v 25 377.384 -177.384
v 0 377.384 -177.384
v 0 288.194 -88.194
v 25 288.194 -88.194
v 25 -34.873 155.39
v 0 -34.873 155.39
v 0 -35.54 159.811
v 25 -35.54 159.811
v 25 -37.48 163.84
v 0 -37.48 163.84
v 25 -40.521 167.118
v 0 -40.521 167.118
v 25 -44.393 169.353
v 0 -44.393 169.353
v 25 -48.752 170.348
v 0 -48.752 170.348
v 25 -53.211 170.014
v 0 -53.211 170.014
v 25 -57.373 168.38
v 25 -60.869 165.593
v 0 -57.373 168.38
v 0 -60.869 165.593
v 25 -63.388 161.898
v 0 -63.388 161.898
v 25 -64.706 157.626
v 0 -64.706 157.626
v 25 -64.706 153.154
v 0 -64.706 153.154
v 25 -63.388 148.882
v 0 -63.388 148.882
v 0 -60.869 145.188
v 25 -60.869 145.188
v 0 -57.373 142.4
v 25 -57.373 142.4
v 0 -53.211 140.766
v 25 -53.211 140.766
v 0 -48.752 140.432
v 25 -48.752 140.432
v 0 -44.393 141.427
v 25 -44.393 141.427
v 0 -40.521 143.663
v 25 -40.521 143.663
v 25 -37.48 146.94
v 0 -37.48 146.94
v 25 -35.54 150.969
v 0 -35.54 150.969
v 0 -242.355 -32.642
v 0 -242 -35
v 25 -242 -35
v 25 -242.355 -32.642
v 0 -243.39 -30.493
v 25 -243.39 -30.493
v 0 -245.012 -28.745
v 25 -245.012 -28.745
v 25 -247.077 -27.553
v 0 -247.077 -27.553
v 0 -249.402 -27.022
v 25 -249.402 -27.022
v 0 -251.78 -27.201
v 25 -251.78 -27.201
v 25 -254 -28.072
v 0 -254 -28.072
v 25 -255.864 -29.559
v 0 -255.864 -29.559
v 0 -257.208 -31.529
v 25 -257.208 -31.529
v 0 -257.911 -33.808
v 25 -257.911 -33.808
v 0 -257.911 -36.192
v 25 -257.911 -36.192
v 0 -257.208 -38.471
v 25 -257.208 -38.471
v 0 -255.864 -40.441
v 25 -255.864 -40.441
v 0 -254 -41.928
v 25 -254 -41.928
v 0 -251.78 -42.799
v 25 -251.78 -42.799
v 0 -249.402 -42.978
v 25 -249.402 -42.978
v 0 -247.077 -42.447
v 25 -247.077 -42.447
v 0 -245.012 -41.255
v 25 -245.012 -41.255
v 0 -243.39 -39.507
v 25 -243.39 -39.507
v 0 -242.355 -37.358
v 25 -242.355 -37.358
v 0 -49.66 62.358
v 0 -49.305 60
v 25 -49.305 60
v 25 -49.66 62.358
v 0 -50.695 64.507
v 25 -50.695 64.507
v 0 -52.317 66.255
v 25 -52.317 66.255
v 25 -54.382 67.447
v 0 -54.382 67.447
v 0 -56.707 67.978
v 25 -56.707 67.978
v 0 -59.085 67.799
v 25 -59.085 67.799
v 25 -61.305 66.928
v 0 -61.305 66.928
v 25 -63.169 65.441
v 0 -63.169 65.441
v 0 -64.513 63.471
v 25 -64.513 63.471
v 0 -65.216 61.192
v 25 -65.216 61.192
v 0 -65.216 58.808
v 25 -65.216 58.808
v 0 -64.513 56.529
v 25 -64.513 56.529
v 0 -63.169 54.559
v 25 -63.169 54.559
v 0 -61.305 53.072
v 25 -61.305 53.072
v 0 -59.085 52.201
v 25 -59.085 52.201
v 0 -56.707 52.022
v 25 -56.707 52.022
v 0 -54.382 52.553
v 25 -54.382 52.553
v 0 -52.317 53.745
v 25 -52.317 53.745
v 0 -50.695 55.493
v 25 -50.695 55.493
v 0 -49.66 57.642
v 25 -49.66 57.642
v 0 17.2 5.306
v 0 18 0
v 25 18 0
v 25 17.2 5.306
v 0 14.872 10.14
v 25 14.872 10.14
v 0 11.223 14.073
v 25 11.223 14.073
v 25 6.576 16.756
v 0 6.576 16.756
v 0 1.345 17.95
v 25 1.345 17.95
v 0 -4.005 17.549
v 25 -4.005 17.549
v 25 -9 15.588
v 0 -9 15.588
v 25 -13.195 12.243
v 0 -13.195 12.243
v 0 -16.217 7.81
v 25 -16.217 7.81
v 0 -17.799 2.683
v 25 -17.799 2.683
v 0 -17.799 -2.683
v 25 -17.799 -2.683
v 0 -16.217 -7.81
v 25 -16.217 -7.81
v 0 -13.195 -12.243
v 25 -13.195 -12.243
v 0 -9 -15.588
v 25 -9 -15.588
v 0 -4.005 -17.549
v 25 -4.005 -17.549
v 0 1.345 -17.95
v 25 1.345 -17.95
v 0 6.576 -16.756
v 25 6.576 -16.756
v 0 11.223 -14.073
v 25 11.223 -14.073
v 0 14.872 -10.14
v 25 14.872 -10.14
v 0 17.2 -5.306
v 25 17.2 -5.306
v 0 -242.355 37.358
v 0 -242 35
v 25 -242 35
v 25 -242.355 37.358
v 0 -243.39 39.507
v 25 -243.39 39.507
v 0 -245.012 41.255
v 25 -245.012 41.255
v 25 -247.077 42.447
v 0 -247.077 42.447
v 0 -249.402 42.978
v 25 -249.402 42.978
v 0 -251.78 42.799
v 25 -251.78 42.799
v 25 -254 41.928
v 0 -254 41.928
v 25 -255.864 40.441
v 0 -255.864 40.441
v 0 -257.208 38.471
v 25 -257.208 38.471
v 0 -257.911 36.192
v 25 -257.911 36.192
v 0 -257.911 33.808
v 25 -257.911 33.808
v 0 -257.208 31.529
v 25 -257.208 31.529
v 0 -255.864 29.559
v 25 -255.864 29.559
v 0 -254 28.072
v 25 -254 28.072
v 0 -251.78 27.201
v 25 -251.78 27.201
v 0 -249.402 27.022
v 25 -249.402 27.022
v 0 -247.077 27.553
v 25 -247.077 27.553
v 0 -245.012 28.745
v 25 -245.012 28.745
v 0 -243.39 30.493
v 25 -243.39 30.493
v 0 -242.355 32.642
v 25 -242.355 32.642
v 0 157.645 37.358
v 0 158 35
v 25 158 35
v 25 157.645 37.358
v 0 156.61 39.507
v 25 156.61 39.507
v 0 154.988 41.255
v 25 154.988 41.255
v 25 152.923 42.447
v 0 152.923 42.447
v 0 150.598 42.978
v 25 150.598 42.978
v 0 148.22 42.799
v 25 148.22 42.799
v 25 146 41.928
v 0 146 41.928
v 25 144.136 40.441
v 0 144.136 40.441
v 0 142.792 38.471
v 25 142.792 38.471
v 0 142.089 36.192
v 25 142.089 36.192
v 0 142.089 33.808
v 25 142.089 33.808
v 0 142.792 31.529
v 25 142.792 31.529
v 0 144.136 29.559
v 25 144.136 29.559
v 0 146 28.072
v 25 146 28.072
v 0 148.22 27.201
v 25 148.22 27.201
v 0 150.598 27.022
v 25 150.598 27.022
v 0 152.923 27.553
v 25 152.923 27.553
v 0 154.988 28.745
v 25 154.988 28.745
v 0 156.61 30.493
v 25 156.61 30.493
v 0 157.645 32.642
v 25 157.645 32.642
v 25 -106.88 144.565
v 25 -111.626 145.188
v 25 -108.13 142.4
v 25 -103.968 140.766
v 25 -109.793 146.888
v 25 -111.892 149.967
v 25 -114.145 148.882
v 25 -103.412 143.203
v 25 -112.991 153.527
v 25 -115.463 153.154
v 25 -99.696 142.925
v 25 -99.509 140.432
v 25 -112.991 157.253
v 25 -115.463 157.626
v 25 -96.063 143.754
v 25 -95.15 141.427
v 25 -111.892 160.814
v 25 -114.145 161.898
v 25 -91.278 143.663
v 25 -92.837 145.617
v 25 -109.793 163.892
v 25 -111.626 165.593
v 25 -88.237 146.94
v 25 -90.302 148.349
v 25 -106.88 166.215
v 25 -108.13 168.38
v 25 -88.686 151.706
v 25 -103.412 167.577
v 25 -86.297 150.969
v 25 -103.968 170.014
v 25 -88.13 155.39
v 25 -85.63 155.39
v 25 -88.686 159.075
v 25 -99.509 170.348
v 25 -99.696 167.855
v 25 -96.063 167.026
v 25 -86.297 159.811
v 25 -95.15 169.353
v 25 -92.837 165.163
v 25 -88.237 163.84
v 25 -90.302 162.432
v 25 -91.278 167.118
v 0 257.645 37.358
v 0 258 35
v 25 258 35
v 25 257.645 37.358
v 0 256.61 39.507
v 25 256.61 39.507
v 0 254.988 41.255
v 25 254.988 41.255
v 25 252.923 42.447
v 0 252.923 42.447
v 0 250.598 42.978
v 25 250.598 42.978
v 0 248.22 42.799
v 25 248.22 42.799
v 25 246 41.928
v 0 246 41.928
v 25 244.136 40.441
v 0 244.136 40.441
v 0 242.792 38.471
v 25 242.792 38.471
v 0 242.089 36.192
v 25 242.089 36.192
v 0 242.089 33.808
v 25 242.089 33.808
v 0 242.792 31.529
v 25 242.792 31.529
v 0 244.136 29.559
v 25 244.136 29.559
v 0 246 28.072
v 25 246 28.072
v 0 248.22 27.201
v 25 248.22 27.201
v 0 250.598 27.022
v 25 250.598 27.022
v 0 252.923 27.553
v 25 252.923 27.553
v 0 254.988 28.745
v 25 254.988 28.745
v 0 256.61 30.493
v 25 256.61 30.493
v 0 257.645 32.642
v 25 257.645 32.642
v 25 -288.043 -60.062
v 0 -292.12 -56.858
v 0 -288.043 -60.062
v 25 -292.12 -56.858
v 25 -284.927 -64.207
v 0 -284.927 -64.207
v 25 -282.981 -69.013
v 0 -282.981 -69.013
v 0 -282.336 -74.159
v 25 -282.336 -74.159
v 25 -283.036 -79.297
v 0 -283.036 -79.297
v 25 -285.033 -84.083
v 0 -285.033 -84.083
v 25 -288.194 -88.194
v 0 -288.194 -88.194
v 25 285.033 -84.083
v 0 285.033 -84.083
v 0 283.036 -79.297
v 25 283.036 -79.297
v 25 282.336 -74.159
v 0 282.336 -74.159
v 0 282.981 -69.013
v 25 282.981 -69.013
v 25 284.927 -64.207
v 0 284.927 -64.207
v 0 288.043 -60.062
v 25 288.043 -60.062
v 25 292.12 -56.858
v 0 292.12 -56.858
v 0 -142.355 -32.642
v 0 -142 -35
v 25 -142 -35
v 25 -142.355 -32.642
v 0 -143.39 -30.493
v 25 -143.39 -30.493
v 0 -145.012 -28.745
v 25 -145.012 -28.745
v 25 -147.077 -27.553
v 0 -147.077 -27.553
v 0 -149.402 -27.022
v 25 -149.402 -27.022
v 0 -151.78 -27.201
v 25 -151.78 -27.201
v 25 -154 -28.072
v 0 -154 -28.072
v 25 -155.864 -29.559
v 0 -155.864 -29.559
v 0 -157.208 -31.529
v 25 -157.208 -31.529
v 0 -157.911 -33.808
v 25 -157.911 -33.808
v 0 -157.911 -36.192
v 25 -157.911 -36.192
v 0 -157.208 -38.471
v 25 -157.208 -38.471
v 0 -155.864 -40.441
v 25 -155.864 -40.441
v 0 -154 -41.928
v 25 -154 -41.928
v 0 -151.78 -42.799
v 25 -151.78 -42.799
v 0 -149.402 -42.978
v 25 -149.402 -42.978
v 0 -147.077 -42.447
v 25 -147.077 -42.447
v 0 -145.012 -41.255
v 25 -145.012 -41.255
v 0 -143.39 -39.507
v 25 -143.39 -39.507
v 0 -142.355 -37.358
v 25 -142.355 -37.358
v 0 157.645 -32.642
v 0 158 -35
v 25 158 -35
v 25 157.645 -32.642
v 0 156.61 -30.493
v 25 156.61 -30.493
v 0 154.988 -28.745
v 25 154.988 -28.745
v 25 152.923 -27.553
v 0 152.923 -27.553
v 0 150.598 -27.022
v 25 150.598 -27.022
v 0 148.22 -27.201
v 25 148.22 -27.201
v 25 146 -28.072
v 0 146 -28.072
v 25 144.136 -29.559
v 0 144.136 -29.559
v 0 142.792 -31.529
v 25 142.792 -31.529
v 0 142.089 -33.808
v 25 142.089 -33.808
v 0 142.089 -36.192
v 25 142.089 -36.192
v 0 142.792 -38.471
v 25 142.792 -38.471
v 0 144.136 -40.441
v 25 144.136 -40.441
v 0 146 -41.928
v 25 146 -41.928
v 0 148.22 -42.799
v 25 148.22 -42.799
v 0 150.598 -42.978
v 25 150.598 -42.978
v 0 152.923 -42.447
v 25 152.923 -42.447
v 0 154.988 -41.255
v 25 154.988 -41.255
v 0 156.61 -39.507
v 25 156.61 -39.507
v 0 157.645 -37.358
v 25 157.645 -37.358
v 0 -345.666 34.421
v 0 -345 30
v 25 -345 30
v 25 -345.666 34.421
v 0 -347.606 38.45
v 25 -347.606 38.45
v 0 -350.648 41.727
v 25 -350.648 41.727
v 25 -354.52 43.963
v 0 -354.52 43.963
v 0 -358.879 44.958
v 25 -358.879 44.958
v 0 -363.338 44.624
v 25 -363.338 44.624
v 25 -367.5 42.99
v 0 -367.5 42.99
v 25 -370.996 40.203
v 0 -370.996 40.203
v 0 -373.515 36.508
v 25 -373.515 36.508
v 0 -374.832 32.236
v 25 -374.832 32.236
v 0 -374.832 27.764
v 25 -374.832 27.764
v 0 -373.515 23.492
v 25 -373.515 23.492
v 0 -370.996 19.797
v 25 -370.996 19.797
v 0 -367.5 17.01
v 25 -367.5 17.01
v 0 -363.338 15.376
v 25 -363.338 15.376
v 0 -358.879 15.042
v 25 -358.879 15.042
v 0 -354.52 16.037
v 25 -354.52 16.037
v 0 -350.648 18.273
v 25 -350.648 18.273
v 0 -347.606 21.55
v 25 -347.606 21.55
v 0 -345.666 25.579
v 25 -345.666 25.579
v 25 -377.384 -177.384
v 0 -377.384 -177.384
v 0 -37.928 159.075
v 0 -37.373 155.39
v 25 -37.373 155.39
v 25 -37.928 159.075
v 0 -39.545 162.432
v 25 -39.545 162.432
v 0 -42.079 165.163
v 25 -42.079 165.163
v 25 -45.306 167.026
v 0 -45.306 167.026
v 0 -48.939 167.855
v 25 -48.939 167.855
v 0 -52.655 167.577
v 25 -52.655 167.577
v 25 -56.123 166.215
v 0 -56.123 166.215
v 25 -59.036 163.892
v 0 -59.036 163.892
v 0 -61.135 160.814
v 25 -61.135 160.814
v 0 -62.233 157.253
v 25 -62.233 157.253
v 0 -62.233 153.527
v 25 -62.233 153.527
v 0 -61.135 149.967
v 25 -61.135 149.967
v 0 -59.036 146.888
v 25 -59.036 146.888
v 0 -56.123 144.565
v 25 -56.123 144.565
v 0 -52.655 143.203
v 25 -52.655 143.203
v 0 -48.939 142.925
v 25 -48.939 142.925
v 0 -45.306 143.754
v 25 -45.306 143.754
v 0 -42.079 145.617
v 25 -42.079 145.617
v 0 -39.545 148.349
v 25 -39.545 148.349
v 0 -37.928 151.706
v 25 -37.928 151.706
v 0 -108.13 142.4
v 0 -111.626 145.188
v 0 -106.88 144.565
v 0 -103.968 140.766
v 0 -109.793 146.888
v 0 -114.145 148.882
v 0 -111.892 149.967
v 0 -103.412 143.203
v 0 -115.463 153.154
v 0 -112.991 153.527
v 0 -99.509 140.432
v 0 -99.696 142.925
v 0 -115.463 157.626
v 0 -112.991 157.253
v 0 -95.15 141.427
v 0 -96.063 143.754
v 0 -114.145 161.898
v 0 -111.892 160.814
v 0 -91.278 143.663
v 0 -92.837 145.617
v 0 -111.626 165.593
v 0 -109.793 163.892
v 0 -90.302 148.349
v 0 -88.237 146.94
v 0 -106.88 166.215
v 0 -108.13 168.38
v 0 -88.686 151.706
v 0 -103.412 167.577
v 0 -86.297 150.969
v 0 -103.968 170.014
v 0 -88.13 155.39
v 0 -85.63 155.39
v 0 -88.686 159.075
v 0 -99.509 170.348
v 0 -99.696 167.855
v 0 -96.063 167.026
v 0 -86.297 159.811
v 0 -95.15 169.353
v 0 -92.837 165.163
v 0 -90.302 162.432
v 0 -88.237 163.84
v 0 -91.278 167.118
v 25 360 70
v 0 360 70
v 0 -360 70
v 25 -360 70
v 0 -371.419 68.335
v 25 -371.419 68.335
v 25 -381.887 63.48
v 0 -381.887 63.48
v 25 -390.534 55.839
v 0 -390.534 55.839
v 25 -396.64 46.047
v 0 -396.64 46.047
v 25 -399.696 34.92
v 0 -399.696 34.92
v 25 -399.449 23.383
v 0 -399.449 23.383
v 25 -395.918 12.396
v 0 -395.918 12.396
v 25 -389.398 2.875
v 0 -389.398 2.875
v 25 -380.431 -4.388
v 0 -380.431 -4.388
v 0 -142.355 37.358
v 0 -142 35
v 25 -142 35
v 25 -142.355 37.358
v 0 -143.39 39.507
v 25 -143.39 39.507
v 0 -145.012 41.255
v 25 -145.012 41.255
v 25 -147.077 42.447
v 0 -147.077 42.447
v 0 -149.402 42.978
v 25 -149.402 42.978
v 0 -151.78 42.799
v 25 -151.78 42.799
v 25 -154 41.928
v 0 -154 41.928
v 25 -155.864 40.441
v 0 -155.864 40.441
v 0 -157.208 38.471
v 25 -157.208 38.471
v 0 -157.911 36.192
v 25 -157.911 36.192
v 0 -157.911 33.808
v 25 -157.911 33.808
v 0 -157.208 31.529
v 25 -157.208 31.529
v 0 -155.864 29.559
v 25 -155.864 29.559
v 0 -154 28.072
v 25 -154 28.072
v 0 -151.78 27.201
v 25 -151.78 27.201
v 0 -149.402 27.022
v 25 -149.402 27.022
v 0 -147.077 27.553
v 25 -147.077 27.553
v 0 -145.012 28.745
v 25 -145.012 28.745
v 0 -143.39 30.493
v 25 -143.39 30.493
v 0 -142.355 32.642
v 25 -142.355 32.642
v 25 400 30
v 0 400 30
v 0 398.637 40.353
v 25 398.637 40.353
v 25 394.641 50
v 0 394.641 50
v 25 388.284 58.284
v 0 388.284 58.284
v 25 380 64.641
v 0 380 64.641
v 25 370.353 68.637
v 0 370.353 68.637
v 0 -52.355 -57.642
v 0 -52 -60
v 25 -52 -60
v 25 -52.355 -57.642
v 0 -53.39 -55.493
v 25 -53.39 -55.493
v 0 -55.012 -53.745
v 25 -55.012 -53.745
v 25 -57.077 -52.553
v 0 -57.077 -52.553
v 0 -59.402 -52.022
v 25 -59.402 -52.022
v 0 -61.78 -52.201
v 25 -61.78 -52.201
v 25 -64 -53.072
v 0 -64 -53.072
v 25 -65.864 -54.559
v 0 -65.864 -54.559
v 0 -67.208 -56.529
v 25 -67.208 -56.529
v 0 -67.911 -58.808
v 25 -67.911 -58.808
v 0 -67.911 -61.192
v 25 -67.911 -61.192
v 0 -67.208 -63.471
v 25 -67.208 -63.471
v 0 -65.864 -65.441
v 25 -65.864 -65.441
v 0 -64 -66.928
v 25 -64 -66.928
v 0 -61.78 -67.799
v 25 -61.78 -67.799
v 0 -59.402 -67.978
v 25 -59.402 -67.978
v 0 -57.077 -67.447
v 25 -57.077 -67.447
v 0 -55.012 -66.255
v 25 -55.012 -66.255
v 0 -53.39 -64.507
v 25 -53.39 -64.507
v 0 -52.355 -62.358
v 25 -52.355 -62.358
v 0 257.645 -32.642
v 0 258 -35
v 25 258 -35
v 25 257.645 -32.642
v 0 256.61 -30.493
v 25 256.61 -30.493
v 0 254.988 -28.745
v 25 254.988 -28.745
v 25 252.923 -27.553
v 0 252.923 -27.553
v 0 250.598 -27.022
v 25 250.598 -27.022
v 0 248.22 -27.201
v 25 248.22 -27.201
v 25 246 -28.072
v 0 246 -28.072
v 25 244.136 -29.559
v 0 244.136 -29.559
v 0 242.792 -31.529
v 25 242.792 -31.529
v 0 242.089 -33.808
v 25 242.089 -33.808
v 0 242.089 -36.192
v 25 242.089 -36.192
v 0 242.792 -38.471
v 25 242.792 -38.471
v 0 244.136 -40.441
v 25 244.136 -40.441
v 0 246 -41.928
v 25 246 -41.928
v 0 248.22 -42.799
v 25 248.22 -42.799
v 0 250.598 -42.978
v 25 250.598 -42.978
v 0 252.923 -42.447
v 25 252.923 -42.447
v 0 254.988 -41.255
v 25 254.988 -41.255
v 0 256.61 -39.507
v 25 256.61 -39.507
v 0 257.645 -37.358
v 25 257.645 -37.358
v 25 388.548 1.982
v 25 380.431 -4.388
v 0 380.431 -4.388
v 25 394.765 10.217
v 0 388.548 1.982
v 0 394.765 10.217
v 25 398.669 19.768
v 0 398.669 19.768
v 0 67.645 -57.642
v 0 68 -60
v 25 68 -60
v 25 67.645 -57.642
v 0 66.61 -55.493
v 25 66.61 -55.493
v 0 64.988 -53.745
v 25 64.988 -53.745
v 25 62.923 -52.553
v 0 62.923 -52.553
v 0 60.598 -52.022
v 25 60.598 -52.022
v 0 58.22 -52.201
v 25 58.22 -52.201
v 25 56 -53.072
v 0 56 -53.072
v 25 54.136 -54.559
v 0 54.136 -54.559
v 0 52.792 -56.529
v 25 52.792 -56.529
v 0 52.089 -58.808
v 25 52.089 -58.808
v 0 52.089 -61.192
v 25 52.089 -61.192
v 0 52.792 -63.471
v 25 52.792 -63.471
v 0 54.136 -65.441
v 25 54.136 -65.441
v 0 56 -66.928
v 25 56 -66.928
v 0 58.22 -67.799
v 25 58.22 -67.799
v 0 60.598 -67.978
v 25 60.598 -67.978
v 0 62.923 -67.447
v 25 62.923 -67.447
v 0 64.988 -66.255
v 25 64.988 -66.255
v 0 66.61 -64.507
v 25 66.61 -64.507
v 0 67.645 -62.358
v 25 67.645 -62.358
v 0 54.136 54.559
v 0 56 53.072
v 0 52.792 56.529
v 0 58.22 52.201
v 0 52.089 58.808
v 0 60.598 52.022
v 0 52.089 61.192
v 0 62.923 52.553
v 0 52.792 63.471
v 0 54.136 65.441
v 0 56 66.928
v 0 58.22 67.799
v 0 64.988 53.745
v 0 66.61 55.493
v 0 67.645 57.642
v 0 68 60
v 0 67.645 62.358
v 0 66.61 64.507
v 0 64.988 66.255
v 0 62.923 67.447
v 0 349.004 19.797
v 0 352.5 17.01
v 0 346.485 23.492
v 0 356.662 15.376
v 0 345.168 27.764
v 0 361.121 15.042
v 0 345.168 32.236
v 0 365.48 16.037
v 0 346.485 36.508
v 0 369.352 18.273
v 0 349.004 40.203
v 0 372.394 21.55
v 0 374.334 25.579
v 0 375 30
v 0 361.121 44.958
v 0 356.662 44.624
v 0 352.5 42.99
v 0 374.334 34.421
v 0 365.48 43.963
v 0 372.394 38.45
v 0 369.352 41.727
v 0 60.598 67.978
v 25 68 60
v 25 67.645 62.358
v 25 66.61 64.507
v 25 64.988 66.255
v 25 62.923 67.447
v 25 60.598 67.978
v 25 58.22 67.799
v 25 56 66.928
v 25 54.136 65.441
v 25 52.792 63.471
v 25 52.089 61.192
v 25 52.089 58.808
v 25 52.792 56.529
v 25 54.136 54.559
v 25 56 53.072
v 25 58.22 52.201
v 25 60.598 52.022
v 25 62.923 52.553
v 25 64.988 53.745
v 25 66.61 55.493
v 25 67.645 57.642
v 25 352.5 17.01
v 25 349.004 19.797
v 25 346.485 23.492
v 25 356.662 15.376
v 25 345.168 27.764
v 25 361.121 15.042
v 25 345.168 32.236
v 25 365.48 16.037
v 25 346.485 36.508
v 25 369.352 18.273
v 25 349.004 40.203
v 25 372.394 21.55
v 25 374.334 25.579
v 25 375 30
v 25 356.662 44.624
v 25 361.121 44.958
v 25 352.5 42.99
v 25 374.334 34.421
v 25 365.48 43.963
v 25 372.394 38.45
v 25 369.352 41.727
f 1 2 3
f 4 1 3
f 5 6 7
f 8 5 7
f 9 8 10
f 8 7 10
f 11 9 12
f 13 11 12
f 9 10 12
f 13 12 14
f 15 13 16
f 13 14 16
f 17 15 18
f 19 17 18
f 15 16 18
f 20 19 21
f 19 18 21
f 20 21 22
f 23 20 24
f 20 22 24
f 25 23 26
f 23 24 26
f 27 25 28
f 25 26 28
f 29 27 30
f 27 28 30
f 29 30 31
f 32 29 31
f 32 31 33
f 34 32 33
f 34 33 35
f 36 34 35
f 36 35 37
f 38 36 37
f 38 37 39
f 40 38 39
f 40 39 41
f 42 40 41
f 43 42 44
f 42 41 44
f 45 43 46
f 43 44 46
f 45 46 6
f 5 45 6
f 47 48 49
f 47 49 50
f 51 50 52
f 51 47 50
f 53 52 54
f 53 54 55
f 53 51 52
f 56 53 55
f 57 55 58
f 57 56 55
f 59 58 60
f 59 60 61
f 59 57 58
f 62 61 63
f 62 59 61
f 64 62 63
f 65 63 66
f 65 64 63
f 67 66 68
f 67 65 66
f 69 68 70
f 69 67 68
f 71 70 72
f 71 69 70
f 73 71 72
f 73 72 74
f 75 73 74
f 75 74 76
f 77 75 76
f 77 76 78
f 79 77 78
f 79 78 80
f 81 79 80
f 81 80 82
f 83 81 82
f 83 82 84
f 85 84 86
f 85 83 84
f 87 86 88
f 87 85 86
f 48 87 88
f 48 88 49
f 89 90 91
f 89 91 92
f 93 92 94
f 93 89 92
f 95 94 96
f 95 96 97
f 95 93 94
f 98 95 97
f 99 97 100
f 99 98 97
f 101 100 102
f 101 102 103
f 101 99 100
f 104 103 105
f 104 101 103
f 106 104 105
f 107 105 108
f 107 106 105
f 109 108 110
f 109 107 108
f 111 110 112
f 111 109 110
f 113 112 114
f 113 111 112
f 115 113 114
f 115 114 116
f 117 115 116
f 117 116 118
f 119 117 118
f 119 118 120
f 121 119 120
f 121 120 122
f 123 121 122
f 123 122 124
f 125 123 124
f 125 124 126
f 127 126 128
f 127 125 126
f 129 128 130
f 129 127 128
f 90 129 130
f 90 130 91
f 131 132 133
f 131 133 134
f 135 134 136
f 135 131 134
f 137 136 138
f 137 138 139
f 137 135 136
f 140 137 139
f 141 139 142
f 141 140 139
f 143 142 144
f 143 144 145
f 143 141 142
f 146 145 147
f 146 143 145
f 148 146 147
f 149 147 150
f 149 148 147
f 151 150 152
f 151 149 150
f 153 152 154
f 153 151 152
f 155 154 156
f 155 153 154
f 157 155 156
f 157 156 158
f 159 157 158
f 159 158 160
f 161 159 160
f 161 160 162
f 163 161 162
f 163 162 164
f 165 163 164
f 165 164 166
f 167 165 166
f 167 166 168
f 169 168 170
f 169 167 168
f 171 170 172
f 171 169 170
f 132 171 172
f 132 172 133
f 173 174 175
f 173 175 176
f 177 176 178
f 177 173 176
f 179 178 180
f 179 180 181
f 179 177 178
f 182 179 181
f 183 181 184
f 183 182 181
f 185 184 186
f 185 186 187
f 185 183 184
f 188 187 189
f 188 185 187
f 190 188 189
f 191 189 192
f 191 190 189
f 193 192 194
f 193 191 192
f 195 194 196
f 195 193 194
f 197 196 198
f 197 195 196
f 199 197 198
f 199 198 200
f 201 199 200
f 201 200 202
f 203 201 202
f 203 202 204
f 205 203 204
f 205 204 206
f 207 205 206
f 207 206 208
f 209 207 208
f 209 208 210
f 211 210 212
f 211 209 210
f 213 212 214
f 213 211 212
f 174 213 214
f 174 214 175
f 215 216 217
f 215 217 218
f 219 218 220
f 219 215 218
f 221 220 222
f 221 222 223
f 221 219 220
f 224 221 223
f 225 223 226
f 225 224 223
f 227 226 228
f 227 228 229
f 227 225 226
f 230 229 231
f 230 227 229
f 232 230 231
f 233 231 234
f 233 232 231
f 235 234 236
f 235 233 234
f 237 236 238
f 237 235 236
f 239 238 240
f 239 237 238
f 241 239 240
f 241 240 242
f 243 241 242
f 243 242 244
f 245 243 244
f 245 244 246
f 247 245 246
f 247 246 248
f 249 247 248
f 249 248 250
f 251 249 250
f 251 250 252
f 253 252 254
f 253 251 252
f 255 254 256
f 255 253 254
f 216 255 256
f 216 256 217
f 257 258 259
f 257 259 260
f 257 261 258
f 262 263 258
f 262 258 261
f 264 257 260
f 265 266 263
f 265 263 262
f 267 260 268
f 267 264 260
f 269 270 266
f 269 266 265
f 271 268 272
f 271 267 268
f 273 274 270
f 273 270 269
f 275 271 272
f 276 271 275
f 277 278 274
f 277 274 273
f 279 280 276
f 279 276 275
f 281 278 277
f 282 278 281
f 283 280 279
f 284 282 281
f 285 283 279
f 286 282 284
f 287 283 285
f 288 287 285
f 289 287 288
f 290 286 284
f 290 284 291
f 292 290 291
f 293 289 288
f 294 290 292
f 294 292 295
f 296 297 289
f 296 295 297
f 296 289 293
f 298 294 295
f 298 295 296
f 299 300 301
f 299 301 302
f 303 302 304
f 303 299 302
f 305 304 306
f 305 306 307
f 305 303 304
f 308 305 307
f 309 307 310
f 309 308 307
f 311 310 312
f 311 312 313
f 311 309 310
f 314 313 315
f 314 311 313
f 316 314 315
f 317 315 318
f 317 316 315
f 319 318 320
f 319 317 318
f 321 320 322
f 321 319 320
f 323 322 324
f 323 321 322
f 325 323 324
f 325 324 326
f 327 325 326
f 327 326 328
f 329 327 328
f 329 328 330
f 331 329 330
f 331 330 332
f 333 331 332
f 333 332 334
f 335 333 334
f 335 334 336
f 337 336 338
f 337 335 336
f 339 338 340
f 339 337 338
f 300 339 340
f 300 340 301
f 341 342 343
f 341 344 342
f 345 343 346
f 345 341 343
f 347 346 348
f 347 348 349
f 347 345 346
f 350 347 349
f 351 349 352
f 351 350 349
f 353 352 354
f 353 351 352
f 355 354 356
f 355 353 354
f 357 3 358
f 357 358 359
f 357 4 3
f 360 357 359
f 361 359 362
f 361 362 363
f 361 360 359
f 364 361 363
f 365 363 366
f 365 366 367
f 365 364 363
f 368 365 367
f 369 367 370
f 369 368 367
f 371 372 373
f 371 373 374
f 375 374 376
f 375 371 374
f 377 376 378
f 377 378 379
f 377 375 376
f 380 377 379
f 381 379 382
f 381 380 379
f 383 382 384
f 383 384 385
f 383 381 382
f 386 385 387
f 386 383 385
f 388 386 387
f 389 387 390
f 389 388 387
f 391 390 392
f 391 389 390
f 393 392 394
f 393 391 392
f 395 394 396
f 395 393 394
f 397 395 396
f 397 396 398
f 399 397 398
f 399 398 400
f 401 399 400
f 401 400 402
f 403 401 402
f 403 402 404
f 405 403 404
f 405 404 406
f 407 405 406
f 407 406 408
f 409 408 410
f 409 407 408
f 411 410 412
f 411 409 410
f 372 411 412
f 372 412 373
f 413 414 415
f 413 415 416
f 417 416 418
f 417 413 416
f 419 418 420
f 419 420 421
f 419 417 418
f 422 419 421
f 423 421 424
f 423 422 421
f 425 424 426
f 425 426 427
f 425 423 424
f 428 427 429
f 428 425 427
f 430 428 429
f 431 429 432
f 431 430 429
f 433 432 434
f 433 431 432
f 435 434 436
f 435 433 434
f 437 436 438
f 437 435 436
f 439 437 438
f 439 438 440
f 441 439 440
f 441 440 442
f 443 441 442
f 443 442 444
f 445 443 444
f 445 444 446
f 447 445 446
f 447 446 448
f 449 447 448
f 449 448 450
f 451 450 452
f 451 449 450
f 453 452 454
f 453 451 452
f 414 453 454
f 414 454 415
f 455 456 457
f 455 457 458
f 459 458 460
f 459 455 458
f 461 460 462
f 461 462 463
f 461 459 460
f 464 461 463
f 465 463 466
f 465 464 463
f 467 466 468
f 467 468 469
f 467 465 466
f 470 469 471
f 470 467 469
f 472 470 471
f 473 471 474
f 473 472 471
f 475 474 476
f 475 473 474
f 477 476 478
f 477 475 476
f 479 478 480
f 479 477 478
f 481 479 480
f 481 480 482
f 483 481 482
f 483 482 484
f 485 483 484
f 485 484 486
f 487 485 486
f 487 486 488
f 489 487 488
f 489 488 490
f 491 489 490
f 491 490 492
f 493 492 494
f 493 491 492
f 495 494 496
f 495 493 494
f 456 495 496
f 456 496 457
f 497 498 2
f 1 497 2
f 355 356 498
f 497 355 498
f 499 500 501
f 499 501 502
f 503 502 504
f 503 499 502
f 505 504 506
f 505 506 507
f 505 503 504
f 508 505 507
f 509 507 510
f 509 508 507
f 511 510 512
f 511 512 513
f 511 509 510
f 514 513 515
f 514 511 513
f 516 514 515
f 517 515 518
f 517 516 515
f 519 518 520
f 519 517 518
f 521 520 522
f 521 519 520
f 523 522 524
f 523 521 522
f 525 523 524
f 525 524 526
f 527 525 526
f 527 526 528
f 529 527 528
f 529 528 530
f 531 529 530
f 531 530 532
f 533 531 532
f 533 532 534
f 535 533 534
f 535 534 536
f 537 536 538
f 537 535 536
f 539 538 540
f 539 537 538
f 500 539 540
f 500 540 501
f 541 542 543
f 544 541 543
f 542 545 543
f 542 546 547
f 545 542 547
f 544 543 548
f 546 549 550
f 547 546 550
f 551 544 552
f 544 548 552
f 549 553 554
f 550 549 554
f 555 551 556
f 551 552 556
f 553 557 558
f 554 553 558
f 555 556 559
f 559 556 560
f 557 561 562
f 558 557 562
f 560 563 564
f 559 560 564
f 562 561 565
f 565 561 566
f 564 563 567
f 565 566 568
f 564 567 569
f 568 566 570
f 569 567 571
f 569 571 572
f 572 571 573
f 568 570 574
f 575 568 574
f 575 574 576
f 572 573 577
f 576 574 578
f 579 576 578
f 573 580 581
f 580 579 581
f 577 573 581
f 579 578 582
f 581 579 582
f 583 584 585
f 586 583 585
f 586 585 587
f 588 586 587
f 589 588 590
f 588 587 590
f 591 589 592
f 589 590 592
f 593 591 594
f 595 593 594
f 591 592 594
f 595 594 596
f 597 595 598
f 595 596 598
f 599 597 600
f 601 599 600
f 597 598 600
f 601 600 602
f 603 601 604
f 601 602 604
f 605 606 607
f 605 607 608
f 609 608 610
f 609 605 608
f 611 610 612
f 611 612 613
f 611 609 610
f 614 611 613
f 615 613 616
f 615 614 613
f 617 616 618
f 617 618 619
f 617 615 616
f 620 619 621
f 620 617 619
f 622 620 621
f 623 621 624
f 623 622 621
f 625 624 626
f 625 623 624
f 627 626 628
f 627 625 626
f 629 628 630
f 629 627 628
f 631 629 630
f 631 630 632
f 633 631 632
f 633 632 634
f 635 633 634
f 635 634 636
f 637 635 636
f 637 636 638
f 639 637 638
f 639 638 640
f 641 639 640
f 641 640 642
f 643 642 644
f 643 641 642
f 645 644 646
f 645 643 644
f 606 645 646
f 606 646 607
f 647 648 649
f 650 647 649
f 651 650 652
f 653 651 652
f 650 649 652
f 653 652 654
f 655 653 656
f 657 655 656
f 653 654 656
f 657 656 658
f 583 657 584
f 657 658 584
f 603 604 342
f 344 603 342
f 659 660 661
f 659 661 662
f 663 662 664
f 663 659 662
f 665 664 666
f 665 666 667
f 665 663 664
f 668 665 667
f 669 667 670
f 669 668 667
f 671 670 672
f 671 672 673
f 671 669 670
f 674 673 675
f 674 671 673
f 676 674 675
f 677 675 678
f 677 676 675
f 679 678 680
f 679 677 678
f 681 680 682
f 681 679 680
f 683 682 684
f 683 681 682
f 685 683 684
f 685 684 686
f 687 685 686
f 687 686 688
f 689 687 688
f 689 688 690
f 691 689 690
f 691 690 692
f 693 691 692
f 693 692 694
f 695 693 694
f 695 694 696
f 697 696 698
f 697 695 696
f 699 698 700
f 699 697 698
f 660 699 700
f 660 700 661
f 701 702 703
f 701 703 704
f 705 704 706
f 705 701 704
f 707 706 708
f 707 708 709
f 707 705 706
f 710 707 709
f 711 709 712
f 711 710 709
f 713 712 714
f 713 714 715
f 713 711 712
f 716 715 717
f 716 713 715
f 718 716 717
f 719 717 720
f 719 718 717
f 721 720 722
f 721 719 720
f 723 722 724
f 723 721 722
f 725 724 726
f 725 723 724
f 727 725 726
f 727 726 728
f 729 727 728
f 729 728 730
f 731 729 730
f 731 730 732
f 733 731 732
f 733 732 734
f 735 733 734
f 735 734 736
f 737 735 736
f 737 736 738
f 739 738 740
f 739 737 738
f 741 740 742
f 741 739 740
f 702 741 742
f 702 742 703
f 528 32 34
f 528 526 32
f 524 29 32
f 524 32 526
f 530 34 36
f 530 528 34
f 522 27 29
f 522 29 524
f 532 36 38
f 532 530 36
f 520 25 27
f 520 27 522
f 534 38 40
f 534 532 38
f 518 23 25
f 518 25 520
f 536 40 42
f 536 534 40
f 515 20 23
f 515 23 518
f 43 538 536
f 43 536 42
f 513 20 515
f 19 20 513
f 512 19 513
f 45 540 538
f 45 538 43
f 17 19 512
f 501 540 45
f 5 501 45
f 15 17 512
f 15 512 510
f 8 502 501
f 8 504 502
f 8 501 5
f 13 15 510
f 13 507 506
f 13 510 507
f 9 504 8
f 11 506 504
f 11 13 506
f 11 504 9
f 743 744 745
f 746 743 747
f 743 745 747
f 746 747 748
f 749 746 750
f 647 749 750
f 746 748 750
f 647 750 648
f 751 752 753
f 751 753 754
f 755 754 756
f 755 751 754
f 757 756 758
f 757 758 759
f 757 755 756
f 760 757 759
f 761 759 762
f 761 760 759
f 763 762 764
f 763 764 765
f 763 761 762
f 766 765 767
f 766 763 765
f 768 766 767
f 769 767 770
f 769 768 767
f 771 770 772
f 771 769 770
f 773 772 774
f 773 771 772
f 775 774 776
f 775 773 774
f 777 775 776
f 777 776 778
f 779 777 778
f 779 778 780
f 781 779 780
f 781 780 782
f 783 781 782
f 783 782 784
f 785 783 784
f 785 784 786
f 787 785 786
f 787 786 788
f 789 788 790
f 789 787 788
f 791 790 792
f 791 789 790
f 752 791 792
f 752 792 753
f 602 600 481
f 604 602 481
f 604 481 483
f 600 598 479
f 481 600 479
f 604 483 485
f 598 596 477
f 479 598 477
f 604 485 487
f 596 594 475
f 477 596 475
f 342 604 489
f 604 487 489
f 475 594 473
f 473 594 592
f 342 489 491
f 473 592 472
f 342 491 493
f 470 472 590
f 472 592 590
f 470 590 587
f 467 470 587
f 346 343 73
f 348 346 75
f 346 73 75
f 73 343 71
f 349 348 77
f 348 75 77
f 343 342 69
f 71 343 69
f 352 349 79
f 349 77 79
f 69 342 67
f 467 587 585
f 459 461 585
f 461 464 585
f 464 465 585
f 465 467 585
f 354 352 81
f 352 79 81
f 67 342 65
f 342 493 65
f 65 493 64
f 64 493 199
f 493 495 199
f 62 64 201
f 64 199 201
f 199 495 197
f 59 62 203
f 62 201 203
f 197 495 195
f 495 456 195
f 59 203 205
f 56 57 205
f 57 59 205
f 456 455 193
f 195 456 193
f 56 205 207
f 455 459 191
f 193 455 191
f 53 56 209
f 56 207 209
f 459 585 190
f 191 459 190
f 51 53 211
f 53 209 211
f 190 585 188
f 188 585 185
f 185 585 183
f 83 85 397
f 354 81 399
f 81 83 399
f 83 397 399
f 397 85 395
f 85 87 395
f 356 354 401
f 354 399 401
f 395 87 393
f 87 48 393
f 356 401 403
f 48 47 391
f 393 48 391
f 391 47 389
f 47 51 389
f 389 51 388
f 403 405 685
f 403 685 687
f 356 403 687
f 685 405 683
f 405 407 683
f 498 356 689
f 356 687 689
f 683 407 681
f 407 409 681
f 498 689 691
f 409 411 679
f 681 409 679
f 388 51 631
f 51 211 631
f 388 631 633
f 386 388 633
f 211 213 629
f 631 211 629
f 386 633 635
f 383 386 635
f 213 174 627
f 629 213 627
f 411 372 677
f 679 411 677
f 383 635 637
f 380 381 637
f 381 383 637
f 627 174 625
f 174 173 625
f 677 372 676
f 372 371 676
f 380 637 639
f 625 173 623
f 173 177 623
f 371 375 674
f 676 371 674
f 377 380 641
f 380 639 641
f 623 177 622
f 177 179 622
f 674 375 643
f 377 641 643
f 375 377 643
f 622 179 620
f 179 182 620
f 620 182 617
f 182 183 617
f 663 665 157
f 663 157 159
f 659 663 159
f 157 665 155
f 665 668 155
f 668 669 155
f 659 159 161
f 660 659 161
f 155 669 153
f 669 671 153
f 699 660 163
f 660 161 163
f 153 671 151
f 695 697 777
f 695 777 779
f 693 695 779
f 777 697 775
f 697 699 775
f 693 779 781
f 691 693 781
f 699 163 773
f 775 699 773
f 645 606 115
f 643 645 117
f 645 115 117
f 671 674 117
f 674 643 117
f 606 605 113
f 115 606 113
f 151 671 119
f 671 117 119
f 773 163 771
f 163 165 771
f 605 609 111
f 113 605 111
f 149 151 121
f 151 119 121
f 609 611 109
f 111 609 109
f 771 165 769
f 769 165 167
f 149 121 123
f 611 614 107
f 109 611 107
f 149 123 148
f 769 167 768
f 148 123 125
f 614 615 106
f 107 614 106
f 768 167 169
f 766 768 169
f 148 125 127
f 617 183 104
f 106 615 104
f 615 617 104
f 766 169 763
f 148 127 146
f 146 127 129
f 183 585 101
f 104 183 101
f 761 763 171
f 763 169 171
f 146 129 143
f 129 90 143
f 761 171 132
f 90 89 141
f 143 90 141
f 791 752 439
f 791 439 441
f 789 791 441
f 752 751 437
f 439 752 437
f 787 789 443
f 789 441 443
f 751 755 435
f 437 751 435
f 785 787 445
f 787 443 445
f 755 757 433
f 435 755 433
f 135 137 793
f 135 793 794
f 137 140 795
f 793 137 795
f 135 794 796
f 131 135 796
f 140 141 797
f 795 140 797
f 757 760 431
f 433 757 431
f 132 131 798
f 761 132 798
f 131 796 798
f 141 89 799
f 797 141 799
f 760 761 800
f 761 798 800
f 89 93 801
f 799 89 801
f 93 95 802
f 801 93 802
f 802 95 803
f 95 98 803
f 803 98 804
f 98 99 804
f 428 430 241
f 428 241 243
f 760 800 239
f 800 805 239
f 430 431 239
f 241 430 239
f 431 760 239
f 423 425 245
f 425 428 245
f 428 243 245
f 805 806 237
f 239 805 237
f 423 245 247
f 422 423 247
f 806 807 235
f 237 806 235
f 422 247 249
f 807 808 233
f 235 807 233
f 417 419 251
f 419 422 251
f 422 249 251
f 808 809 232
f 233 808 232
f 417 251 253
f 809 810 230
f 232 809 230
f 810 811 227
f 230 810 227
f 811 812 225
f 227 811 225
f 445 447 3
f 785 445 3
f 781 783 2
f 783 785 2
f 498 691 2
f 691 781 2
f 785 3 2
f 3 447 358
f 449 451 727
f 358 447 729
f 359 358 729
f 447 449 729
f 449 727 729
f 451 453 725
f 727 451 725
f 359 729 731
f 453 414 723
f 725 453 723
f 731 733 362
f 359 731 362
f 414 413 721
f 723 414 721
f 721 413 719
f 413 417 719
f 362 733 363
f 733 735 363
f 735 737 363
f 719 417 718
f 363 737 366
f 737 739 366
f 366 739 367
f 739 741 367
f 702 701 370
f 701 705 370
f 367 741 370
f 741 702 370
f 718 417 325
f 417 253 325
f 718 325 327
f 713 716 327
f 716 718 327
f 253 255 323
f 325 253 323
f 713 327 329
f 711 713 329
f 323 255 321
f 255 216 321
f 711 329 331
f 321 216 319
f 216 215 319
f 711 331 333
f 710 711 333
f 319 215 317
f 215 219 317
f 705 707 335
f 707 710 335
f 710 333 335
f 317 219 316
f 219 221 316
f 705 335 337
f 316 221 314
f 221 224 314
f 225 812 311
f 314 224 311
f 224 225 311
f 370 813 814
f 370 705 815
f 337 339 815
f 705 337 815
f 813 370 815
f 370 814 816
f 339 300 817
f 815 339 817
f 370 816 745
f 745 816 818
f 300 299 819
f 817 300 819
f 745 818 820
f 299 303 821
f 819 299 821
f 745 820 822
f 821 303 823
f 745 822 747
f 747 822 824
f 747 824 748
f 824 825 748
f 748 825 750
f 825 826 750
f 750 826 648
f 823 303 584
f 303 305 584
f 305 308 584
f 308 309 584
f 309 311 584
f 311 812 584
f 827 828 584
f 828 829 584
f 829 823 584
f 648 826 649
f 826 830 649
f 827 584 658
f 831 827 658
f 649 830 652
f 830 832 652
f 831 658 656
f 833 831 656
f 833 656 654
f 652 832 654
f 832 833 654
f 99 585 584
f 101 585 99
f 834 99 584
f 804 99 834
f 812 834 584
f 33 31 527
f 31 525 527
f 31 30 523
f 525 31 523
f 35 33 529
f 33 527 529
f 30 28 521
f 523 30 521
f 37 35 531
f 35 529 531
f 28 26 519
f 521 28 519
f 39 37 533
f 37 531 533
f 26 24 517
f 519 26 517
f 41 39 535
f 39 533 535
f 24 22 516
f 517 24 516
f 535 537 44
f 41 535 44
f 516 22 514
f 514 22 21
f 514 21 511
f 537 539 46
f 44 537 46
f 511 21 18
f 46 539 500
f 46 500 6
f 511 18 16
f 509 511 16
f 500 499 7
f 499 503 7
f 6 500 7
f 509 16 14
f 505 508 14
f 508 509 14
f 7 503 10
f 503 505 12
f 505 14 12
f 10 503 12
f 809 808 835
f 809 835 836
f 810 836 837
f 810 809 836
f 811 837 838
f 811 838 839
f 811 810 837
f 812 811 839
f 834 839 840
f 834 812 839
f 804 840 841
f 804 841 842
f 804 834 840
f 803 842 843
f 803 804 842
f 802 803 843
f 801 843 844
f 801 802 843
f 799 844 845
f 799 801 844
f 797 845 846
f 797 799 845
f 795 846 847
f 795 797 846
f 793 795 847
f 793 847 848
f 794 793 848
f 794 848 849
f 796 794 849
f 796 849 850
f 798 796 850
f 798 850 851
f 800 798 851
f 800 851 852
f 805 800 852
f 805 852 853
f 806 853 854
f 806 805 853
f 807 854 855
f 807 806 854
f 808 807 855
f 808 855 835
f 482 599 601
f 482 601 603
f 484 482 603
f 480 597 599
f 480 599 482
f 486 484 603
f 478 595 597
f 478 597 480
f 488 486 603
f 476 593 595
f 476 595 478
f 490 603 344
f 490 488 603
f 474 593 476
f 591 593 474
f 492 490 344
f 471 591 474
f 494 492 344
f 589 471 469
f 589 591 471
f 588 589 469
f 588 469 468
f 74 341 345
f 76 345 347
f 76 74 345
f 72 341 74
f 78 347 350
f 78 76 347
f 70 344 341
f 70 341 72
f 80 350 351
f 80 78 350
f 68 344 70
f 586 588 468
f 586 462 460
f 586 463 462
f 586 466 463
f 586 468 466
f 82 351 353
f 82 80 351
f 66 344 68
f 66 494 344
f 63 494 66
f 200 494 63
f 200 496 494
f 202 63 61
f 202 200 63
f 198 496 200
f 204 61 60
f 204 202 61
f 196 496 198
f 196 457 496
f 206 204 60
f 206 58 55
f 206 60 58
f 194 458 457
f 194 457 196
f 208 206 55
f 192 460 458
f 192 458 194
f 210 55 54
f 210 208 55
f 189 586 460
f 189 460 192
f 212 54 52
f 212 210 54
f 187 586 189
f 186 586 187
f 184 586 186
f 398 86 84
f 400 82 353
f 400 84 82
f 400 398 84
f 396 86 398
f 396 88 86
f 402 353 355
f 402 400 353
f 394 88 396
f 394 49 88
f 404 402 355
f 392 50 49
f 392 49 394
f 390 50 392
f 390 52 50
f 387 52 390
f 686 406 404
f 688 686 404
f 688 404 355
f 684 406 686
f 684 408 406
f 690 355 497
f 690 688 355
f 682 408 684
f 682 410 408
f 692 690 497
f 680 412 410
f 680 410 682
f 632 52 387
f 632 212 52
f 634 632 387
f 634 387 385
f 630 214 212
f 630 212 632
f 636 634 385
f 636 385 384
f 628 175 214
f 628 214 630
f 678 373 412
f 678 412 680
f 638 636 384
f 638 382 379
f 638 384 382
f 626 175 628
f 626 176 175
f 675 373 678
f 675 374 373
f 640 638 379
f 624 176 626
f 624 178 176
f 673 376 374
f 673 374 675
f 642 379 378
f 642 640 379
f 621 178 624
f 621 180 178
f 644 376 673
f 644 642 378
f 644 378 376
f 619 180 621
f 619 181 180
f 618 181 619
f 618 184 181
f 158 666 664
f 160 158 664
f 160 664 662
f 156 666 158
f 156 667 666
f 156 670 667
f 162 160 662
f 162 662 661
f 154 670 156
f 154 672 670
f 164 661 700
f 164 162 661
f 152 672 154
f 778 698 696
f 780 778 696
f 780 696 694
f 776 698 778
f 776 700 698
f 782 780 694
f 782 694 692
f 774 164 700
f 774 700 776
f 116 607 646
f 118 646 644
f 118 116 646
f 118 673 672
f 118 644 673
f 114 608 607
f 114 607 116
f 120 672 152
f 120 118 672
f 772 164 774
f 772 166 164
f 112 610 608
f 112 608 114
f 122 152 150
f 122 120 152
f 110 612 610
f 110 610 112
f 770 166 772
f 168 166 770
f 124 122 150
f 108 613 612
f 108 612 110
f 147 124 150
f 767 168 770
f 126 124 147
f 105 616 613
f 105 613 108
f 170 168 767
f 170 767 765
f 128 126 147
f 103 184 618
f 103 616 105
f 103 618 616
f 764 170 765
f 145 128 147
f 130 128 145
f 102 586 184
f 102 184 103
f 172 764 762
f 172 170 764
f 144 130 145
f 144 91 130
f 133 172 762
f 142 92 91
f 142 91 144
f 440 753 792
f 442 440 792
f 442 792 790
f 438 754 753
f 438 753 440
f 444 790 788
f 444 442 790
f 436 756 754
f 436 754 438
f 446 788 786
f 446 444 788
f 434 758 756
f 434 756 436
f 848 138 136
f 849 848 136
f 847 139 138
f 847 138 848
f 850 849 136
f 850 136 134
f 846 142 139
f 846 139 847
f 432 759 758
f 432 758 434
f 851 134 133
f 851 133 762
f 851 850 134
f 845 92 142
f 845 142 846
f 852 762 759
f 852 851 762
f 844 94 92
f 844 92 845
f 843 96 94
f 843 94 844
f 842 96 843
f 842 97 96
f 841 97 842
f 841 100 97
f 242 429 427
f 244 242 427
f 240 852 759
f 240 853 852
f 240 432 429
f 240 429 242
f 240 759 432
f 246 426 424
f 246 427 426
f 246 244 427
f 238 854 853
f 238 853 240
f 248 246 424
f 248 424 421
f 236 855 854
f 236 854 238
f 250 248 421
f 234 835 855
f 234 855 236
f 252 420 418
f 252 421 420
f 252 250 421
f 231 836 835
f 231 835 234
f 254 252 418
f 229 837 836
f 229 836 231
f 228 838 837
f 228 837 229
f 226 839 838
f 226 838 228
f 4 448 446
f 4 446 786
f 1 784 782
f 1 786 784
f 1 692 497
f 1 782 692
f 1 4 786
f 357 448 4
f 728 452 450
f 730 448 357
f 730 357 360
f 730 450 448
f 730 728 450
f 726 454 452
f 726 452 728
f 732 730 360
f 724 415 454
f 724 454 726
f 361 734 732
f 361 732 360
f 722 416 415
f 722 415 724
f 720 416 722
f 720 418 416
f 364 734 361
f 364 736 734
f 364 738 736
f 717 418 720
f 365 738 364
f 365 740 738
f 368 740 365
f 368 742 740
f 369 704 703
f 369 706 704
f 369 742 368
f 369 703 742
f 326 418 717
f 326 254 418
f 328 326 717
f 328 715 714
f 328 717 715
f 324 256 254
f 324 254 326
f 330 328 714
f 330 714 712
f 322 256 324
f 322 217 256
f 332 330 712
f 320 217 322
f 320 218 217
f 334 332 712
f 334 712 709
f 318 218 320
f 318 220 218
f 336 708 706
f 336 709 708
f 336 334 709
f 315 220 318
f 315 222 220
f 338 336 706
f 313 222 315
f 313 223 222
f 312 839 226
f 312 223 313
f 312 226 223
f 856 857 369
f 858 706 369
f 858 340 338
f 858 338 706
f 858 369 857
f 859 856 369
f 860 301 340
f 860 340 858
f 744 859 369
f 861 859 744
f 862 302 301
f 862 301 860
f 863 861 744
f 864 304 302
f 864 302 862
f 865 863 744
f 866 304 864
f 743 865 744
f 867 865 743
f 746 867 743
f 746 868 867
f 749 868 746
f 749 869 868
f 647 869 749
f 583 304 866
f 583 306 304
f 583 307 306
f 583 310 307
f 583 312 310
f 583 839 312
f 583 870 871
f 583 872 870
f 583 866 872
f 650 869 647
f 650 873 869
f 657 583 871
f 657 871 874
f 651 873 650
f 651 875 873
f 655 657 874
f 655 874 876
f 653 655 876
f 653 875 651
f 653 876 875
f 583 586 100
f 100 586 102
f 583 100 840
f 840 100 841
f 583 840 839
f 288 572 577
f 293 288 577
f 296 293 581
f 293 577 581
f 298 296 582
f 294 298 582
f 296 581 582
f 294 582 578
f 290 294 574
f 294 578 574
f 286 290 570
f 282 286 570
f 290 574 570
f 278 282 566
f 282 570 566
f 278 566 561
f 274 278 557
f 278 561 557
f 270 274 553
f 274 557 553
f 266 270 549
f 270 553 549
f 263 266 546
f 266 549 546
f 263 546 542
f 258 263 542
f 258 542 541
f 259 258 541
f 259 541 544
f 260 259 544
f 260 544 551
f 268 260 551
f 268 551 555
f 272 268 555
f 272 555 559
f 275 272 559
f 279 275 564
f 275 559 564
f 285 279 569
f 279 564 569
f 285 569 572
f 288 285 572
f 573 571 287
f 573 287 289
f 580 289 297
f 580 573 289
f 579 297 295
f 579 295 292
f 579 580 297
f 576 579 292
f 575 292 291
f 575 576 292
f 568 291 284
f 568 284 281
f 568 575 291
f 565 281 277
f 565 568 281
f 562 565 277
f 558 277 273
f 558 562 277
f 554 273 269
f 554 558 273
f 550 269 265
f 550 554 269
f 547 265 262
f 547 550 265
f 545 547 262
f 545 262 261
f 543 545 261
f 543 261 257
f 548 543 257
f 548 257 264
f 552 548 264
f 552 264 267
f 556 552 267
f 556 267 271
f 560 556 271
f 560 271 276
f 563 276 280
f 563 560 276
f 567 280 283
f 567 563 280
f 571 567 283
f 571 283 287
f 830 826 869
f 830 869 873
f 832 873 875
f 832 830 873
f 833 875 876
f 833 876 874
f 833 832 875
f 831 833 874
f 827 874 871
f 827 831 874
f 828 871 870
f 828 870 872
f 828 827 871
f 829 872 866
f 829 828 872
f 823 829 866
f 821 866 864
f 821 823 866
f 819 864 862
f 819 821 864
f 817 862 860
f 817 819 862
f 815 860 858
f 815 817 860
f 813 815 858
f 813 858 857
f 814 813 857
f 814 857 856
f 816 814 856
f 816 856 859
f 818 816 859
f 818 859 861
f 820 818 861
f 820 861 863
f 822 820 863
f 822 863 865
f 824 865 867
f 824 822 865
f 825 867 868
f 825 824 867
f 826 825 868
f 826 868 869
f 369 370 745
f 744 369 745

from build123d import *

# Parameters (mm, degrees)
F0_W     = 540
F0_H     = 140
F0_R     = 8
F0_R_2   = 18
F0_R_3   = 15
F1_DEPTH = 25
F2_R     = 15
F2_R_2   = 12.5
F3_DEPTH = 25
F6_R     = 20


# Not quite as in the source:
# - a feature names something its author has since deleted; it is built from what else it names


with BuildPart() as f1:
    # F0 (on Right) → F1 (new body)
    with BuildSketch(Plane.YZ):
        Rectangle(F0_W, F0_H)
        with Locations((-60, -60)):
            Circle(F0_R, mode=Mode.SUBTRACT)
        with Locations((60, -60)):
            Circle(F0_R, mode=Mode.SUBTRACT)
        with Locations((-250, -35)):
            Circle(F0_R, mode=Mode.SUBTRACT)
        with Locations((-150, -35)):
            Circle(F0_R, mode=Mode.SUBTRACT)
        with Locations((-250, 35)):
            Circle(F0_R, mode=Mode.SUBTRACT)
        with Locations((-150, 35)):
            Circle(F0_R, mode=Mode.SUBTRACT)
        with Locations((-57.3049411178, 60)):
            Circle(F0_R, mode=Mode.SUBTRACT)
        with Locations((150, -35)):
            Circle(F0_R, mode=Mode.SUBTRACT)
        Circle(F0_R_2, mode=Mode.SUBTRACT)
        with Locations((250, -35)):
            Circle(F0_R, mode=Mode.SUBTRACT)
        with Locations((150, 35)):
            Circle(F0_R, mode=Mode.SUBTRACT)
        with Locations((60, 60)):
            Circle(F0_R, mode=Mode.SUBTRACT)
        with Locations((250, 35)):
            Circle(F0_R, mode=Mode.SUBTRACT)
        with BuildLine():
            Line((-270, -70), (-270, 70))
            Line((-270, 70), (-360, 70))
            ThreePointArc((-360, 70), (-331.7157287525, 58.2842712475), (-320, 30))
            ThreePointArc((-320, 30), (-340.2169027766, -4.7653428611), (-380.4314532125, -4.3883078913))
            Line((-380.4314532125, -4.3883078913), (-270, -70))
        make_face()
        with BuildLine():
            Line((360, 70), (270, 70))
            Line((270, 70), (270, -70))
            Line((270, -70), (380.4314532125, -4.3883078913))
            ThreePointArc((380.4314532125, -4.3883078913), (321.4284281131, 19.4059525122), (360, 70))
        make_face()
        with BuildLine():
            ThreePointArc((-320, 30), (-331.7157287525, 58.2842712475), (-360, 70))
            ThreePointArc((-360, 70), (-398.5715718869, 40.5940474878), (-380.4314532125, -4.3883078913))
            ThreePointArc((-380.4314532125, -4.3883078913), (-340.2169027766, -4.7653428611), (-320, 30))
        make_face()
        with Locations((-360, 30)):
            Circle(F0_R_3, mode=Mode.SUBTRACT)
        with BuildLine():
            ThreePointArc((400, 30), (388.2842712475, 58.2842712475), (360, 70))
            ThreePointArc((360, 70), (321.4284281131, 19.4059525122), (380.4314532125, -4.3883078913))
            ThreePointArc((380.4314532125, -4.3883078913), (394.7653428611, 10.2169027766), (400, 30))
        make_face()
        with Locations((360, 30)):
            Circle(F0_R_3, mode=Mode.SUBTRACT)
        Polygon((270, -70), (-270, -70), (-377.3844690551, -177.3844690551), (377.3844690551, -177.3844690551), align=None)
    extrude(amount=F1_DEPTH)

    # F6
    f6_edges = [f1.edges().sort_by_distance(p)[0] for p in [
        (12.5, -270, -70),
        (12.5, 270, -70),
    ]]
    fillet(f6_edges, radius=F6_R)


with BuildPart() as f3:
    # F2 (on Right) → F3 (new body)
    with BuildSketch(Plane.YZ):
        with Locations((-213.5602489911, 155.390098691)):
            Circle(F2_R)
        with Locations((-213.5602489911, 155.390098691)):
            Circle(F2_R_2, mode=Mode.SUBTRACT)
    extrude(amount=F3_DEPTH)


with BuildPart() as f3b:
    # F2 (on Right) → F3, piece 2 (new body)
    with BuildSketch(Plane.YZ):
        with Locations((-154.9366889584, 155.390098691)):
            Circle(F2_R)
        with Locations((-154.9366889584, 155.390098691)):
            Circle(F2_R_2, mode=Mode.SUBTRACT)
    extrude(amount=F3_DEPTH)


with BuildPart() as f3c:
    # F2 (on Right) → F3, piece 3 (new body)
    with BuildSketch(Plane.YZ):
        with Locations((-100.630173799, 155.390098691)):
            Circle(F2_R)
        with Locations((-100.630173799, 155.390098691)):
            Circle(F2_R_2, mode=Mode.SUBTRACT)
    extrude(amount=F3_DEPTH)


with BuildPart() as f3d:
    # F2 (on Right) → F3, piece 4 (new body)
    with BuildSketch(Plane.YZ):
        with Locations((-49.8730993964, 155.390098691)):
            Circle(F2_R)
        with Locations((-49.8730993964, 155.390098691)):
            Circle(F2_R_2, mode=Mode.SUBTRACT)
    extrude(amount=F3_DEPTH)


solid = Compound([f1.part, f3c.part, f3d.part])
